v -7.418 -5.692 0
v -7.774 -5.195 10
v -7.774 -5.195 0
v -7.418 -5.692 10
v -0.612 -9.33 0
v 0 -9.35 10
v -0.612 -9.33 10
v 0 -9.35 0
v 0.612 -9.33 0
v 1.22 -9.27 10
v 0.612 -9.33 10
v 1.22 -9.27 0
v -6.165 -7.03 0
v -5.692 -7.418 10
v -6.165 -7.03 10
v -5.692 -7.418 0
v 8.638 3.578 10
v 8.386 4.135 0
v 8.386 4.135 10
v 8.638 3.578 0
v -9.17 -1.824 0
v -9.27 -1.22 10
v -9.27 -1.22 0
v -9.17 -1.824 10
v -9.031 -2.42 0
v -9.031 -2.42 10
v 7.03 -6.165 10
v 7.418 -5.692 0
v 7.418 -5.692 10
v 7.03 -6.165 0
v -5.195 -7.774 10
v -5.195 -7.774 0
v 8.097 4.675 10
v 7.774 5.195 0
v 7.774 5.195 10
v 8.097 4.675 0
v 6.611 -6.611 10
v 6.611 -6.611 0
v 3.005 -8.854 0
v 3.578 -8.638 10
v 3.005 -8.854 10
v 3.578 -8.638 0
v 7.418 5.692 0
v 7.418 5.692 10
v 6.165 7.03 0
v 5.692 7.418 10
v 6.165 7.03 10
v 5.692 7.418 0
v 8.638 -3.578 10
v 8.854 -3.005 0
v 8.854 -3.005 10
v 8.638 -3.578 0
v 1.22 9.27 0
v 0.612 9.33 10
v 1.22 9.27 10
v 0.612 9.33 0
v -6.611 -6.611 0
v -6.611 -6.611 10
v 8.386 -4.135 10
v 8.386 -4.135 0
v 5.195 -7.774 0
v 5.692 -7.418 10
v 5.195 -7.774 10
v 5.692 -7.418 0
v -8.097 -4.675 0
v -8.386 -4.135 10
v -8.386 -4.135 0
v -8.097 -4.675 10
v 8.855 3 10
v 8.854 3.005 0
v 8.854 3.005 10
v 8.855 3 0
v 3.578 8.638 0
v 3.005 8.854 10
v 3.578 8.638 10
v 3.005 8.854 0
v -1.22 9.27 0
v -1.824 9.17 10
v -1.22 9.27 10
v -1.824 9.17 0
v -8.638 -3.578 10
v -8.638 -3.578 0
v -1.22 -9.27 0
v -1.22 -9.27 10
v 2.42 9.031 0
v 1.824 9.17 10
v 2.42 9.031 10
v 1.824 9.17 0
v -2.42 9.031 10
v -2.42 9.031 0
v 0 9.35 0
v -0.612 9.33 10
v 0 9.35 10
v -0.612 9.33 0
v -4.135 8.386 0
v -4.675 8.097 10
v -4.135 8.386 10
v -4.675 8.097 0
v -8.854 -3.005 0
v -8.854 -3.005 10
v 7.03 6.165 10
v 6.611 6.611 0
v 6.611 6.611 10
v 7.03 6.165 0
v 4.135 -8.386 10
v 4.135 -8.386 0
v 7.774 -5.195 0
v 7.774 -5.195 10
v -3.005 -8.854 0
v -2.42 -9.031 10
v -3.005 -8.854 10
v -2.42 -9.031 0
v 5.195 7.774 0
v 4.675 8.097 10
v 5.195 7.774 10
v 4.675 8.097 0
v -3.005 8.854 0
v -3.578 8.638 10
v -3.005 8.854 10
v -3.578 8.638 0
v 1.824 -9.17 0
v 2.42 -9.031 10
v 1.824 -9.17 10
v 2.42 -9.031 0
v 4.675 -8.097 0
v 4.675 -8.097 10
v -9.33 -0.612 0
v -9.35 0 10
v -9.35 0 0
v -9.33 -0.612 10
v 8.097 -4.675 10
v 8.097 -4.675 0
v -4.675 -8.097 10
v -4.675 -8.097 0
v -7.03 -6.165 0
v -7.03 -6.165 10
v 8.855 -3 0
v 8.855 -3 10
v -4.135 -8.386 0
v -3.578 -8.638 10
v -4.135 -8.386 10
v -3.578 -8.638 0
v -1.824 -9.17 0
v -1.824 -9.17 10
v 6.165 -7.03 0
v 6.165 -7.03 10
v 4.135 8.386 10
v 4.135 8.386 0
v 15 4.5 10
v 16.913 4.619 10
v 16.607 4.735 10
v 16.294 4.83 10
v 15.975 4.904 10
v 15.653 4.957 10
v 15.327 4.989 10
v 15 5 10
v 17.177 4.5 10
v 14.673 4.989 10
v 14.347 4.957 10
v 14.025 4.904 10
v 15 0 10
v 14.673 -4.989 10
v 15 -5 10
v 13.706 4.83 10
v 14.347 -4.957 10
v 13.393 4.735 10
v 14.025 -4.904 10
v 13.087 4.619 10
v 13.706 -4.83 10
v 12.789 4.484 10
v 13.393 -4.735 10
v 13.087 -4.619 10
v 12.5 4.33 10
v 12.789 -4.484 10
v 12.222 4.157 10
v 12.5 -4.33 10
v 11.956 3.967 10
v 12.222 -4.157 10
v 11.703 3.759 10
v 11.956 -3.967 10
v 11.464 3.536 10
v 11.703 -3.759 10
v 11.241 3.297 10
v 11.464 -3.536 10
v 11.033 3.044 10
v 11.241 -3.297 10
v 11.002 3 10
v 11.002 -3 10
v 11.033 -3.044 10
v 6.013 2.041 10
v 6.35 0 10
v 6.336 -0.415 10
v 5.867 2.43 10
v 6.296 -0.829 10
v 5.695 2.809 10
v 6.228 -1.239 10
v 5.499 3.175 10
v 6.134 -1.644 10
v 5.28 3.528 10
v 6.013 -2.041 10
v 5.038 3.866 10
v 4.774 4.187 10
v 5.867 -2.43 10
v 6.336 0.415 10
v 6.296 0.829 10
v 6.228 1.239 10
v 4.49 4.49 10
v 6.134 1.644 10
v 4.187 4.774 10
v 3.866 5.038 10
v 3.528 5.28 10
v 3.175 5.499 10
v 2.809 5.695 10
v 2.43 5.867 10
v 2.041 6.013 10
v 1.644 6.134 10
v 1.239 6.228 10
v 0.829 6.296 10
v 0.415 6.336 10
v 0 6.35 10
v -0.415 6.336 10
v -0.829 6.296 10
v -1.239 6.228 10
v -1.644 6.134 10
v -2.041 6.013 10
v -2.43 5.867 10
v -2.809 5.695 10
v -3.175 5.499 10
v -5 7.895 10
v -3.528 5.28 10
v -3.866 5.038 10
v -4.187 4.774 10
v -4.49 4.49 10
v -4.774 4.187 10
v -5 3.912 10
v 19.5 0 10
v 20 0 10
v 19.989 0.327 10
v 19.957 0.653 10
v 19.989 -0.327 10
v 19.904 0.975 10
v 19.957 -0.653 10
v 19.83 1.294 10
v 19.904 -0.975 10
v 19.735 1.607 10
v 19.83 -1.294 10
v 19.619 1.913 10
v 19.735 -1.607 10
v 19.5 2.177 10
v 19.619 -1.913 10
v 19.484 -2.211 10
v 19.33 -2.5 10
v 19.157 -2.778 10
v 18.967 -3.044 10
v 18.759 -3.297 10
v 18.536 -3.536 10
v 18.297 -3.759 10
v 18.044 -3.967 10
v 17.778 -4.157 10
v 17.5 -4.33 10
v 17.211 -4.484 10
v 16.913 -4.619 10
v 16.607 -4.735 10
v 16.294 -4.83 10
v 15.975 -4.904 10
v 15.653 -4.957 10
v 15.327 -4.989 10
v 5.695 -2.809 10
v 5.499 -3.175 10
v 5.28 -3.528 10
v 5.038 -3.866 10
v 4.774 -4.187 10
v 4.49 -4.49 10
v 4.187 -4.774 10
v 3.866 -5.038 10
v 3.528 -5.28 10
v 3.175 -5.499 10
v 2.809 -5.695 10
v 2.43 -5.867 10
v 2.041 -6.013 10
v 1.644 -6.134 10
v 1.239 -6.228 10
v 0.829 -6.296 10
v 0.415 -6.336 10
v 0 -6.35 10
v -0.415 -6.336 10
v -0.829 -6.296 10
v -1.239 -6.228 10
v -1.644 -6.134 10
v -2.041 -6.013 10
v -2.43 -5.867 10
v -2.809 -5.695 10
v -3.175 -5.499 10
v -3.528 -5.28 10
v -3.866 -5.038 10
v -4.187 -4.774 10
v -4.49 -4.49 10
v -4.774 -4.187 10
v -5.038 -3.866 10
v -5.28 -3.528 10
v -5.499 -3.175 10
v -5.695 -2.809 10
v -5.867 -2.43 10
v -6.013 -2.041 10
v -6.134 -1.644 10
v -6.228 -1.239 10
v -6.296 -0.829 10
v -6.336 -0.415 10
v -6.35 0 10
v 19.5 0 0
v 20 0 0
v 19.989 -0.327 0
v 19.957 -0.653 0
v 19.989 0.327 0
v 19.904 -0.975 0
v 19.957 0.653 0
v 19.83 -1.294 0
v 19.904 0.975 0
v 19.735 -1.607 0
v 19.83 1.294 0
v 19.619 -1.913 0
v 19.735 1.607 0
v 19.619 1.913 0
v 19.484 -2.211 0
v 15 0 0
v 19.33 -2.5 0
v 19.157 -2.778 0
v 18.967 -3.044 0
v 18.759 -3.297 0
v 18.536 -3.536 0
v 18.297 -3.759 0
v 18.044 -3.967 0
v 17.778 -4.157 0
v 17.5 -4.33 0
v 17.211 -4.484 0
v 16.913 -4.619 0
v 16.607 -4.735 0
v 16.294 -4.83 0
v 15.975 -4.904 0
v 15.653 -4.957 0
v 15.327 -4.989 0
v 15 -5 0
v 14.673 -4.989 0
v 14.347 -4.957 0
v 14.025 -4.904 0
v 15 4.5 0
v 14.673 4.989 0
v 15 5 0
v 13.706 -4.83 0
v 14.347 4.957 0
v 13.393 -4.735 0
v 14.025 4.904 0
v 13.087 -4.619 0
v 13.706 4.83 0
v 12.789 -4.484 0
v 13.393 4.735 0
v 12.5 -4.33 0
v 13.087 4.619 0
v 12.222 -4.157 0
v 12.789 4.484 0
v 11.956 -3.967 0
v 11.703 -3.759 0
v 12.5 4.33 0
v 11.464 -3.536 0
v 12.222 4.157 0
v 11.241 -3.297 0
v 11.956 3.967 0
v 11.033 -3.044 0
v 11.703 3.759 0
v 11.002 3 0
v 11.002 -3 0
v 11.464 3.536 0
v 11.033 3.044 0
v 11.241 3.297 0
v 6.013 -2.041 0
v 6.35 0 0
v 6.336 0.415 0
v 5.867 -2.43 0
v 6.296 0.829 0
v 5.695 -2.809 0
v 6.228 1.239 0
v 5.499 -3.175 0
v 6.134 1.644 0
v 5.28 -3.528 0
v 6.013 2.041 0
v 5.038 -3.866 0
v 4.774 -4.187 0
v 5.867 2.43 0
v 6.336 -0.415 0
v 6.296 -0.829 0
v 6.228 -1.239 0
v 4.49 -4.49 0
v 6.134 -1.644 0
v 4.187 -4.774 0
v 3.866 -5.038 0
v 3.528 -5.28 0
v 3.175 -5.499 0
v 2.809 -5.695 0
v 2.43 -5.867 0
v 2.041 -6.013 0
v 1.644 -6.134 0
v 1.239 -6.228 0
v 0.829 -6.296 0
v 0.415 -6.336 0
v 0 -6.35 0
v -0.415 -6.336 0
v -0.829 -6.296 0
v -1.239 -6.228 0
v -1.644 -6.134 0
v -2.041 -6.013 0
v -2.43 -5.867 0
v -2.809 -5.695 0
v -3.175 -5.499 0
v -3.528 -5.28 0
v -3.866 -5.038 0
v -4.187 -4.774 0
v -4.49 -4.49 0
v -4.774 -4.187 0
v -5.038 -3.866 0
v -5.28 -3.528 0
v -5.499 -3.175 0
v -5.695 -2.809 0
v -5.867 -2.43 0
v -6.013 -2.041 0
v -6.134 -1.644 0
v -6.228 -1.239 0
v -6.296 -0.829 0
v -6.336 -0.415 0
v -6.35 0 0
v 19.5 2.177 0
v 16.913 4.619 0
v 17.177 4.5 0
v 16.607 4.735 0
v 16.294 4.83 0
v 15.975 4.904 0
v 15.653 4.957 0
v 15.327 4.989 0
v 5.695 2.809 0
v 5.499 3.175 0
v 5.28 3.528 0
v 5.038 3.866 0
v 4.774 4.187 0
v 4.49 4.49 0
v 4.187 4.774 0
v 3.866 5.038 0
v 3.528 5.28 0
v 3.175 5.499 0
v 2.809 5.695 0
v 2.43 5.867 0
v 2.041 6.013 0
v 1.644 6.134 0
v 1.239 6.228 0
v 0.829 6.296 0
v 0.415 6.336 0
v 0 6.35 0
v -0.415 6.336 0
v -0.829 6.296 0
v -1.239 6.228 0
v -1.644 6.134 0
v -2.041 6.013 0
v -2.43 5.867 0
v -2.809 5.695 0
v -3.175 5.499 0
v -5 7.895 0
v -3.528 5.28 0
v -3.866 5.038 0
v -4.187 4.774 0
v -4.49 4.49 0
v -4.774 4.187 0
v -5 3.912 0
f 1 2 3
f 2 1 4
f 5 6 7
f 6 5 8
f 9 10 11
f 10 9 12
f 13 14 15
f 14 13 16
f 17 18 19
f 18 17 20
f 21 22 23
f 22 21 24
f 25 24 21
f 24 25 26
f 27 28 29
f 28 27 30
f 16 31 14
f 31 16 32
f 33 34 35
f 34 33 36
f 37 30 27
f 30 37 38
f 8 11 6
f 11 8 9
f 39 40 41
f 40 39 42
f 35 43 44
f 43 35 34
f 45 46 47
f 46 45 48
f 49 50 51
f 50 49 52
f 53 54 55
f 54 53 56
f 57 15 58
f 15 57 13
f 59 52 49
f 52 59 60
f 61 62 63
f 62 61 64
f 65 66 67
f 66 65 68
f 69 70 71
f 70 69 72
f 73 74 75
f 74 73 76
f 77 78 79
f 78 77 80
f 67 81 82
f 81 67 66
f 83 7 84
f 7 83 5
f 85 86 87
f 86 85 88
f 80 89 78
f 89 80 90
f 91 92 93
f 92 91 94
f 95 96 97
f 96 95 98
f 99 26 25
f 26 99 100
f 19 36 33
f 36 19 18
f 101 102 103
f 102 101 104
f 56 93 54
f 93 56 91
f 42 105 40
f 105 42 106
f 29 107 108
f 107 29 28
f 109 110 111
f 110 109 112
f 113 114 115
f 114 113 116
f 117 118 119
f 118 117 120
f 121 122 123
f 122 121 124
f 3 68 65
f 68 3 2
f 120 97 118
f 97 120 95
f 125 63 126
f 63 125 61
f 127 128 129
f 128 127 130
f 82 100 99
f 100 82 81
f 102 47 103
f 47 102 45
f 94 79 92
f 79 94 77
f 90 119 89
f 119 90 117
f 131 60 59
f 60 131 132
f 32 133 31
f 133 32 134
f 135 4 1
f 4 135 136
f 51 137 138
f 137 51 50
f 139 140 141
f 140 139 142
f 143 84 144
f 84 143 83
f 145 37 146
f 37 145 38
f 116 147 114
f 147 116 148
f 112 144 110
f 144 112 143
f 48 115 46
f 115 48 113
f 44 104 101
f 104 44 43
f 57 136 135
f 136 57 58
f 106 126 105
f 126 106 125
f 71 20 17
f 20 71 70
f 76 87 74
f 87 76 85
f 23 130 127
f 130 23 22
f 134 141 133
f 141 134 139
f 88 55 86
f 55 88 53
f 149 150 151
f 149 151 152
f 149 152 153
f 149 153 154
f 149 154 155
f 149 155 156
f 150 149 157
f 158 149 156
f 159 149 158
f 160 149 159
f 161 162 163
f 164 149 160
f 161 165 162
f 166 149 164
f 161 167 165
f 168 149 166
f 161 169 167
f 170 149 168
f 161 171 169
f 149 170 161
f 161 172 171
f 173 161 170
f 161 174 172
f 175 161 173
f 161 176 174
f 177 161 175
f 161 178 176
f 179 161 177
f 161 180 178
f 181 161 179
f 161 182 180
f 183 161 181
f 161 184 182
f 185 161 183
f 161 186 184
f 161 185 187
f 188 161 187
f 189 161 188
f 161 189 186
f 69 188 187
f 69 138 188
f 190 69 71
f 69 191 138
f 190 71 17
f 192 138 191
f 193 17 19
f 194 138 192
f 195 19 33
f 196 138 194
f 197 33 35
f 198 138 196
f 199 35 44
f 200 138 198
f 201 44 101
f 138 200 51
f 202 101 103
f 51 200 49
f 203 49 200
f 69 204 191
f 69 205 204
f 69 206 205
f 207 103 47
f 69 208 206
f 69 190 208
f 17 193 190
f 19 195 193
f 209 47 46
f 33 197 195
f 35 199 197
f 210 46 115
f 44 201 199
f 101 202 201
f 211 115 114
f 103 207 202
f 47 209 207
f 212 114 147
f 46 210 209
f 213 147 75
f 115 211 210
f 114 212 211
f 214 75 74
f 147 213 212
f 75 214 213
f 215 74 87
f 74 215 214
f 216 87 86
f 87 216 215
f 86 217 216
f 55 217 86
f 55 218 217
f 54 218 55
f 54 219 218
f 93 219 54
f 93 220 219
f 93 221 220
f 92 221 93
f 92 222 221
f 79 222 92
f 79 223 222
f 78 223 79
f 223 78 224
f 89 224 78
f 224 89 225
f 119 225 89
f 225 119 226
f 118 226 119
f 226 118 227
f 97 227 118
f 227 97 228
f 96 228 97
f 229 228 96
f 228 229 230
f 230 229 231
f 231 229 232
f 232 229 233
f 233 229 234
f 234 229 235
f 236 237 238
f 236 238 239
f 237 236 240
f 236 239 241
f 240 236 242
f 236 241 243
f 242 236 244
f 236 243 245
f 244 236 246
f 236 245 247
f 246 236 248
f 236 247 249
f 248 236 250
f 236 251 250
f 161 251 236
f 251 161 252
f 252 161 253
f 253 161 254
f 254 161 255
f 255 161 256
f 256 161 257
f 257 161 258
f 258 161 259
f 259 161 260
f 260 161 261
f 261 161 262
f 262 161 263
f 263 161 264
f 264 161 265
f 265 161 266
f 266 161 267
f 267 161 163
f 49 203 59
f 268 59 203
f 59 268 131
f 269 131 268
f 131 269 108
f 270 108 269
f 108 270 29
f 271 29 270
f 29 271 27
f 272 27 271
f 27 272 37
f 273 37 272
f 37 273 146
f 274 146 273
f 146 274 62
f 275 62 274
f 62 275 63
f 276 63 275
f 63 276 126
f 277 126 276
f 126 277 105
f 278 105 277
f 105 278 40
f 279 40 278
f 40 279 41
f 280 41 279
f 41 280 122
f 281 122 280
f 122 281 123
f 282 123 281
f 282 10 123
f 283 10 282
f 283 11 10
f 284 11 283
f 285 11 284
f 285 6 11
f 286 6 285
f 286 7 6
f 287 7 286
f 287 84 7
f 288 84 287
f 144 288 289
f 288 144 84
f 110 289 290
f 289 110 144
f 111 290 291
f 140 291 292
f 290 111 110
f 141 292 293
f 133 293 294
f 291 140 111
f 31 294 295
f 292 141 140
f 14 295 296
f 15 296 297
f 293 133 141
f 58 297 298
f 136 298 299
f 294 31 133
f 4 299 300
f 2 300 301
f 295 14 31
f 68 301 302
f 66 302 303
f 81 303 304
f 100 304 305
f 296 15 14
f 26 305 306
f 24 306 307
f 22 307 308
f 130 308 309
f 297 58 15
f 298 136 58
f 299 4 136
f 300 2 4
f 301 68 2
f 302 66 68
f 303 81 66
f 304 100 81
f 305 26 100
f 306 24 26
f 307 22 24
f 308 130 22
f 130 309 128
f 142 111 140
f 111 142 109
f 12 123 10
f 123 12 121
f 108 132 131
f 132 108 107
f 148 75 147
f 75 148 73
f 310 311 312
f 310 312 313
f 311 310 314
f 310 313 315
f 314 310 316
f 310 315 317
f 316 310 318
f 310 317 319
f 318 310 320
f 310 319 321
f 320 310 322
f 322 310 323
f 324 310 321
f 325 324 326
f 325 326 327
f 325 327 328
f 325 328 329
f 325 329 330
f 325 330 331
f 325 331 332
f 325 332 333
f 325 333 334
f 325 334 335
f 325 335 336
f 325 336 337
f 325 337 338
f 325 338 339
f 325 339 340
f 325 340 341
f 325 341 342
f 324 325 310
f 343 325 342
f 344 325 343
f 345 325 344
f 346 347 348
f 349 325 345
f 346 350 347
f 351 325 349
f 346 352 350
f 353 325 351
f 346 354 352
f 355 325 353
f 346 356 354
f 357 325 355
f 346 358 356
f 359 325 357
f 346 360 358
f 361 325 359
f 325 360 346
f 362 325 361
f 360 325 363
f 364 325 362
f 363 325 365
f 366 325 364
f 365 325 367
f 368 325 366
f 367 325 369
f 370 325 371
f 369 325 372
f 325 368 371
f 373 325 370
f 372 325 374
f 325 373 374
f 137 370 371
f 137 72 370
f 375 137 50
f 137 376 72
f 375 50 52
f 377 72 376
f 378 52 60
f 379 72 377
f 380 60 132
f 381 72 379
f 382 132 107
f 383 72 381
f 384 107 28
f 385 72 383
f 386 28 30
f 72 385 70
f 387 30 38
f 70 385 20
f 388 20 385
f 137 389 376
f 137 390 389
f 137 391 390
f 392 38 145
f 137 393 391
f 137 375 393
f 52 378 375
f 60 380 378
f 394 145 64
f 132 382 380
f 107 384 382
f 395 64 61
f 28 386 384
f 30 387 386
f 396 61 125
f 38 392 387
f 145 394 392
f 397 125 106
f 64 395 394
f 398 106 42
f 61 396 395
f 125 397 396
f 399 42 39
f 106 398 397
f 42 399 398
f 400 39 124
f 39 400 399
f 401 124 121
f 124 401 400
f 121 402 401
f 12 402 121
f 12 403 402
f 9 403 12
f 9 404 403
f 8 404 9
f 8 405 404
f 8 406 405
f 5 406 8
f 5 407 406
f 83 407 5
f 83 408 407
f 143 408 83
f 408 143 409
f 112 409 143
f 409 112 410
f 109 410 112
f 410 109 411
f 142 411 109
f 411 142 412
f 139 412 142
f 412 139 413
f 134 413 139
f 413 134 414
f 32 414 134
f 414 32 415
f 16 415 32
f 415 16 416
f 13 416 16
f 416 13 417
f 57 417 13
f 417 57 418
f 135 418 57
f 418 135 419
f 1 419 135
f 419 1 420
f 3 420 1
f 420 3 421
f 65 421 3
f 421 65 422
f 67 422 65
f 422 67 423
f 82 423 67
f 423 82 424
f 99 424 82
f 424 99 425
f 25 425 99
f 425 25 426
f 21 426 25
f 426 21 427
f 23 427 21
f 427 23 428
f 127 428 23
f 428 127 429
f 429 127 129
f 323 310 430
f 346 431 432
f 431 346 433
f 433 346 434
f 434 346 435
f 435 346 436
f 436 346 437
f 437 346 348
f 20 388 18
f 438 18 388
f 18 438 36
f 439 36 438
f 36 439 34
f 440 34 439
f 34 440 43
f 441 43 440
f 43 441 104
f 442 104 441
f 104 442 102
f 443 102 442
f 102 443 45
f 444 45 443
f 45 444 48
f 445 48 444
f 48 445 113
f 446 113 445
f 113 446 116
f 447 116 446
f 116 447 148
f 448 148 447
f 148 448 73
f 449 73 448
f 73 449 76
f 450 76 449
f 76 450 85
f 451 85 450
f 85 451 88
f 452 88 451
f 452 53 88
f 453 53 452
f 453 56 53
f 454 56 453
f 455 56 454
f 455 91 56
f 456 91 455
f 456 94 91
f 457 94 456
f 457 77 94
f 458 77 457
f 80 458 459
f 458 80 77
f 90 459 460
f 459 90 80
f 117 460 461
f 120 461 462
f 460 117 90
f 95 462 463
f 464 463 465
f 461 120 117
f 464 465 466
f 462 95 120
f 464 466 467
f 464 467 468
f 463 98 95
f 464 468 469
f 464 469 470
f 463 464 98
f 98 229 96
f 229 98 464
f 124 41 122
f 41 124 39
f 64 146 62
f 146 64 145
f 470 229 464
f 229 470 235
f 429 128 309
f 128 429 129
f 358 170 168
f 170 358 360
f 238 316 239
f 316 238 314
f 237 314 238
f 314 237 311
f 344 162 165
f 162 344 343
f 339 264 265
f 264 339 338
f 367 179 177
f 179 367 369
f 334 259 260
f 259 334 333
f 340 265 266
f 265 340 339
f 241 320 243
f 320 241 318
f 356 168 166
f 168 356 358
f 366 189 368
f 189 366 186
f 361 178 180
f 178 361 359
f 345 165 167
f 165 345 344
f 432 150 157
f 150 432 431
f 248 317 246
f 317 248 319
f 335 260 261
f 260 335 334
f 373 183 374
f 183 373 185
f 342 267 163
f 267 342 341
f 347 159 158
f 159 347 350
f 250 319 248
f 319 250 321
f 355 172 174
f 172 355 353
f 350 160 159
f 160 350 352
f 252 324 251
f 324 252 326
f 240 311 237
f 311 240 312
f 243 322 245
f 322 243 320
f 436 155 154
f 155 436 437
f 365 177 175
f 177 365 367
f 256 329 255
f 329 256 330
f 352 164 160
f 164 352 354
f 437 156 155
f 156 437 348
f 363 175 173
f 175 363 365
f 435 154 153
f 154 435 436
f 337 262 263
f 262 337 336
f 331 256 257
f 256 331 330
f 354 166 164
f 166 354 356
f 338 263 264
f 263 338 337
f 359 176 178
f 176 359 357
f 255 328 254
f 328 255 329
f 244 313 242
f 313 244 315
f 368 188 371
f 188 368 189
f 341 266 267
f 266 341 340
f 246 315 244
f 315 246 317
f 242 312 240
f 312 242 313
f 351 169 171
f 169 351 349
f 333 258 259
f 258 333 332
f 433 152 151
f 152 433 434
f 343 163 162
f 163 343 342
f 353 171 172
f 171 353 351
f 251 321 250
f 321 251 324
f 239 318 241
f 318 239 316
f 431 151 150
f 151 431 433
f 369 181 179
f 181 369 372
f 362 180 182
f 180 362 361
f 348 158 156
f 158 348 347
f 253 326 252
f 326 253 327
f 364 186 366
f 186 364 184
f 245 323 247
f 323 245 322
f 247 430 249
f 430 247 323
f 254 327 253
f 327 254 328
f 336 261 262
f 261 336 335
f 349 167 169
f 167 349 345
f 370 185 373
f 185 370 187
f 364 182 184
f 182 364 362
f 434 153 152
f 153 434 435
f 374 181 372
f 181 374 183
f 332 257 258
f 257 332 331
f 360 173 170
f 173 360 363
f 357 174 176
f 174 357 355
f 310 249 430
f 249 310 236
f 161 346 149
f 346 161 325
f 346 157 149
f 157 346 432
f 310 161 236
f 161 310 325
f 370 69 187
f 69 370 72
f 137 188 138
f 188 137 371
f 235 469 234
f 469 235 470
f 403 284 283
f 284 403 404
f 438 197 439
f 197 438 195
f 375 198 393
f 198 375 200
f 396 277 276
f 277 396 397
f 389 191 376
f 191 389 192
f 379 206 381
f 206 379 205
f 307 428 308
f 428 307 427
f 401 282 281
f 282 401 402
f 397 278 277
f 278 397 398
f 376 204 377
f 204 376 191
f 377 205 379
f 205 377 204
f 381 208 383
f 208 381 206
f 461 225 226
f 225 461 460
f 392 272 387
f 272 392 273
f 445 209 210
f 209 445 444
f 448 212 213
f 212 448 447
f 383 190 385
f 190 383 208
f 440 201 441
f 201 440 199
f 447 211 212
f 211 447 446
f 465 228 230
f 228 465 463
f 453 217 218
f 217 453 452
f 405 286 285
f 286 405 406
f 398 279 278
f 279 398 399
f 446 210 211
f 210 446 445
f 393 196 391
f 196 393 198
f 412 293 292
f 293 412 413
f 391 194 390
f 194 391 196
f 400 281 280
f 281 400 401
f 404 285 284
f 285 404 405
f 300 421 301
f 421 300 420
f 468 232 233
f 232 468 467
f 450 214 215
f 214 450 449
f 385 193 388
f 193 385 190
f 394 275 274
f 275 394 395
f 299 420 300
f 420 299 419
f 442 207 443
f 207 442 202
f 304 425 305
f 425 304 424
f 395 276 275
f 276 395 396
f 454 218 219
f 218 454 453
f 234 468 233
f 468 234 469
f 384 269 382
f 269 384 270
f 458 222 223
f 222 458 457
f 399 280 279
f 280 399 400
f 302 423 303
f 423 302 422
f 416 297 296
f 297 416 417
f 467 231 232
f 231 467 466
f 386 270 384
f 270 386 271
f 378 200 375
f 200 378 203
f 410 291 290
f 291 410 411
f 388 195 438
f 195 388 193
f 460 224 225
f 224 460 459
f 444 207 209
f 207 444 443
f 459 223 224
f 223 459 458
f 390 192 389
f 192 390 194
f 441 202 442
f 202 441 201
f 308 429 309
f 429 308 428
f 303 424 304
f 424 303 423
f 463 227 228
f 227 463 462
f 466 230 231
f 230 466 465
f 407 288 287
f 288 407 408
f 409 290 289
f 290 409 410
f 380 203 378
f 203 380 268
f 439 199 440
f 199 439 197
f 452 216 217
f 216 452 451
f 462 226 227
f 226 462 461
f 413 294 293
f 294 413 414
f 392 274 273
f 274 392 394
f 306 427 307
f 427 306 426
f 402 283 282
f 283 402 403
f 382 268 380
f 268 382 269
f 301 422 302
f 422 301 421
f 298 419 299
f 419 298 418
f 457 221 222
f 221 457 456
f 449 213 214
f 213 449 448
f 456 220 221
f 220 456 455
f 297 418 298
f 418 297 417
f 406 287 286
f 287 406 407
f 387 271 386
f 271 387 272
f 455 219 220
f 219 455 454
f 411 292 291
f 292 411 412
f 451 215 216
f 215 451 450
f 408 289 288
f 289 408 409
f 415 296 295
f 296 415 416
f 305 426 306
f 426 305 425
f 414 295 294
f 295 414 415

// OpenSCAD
// Tubing clip for 12.7 mm lab stand rod
// Print orientation: flat on bed, extruded in +Z

$fn = 96;

// ---- Dimensions (mm) ----
rod_d      = 12.7;   // rod diameter
ring_w     = 3;      // rod ring wall
rod_od     = rod_d + 2*ring_w; // rod ring outer diameter (18.7)
rod_h      = 10;     // clip height (Z)

tub_d      = 6;      // tubing inner diameter
tub_w      = 2;      // tubing wall
tub_od     = tub_d + 2*tub_w; // tubing outer diameter (10)
tub_x      = 15;     // tubing ring centre X
tub_h      = 10;     // clip height (Z)

opening_w  = 10;     // rod ring opening width (-X side)
open_x     = -15;    // opening centre X
open_y     = 0;      // opening centre Y

tub_open_w = 4.5;    // tubing opening width (+X side)
tub_open_x = 15;     // tubing opening centre X
tub_open_y = 0;      // tubing opening centre Y

bridge_x1  = 8;      // bridge start X
bridge_x2  = 12;     // bridge end X
bridge_w   = 6;      // bridge width (Y)

eps        = 0.5;    // cutter overshoot

// ---- Model ----
difference() {
    union() {
        // Rod ring
        difference() {
            cylinder(d = rod_od, h = rod_h);
            translate([open_x, open_y, -eps])
                cube([opening_w, opening_w, rod_h + 2*eps]);
        }
        // Tubing ring
        translate([tub_x, 0, 0])
            difference() {
                cylinder(d = tub_od, h = tub_h);
                translate([0, tub_open_y, -eps])
                    cube([tub_open_w, tub_open_w, tub_h + 2*eps]);
            }
        // Bridge
        translate([bridge_x1, -bridge_w/2, 0])
            cube([bridge_x2 - bridge_x1, bridge_w, rod_h]);
    }
    // Rod (snap fit)
    translate([0, 0, -eps])
        cylinder(d = rod_d, h = rod_h + 2*eps);
}
